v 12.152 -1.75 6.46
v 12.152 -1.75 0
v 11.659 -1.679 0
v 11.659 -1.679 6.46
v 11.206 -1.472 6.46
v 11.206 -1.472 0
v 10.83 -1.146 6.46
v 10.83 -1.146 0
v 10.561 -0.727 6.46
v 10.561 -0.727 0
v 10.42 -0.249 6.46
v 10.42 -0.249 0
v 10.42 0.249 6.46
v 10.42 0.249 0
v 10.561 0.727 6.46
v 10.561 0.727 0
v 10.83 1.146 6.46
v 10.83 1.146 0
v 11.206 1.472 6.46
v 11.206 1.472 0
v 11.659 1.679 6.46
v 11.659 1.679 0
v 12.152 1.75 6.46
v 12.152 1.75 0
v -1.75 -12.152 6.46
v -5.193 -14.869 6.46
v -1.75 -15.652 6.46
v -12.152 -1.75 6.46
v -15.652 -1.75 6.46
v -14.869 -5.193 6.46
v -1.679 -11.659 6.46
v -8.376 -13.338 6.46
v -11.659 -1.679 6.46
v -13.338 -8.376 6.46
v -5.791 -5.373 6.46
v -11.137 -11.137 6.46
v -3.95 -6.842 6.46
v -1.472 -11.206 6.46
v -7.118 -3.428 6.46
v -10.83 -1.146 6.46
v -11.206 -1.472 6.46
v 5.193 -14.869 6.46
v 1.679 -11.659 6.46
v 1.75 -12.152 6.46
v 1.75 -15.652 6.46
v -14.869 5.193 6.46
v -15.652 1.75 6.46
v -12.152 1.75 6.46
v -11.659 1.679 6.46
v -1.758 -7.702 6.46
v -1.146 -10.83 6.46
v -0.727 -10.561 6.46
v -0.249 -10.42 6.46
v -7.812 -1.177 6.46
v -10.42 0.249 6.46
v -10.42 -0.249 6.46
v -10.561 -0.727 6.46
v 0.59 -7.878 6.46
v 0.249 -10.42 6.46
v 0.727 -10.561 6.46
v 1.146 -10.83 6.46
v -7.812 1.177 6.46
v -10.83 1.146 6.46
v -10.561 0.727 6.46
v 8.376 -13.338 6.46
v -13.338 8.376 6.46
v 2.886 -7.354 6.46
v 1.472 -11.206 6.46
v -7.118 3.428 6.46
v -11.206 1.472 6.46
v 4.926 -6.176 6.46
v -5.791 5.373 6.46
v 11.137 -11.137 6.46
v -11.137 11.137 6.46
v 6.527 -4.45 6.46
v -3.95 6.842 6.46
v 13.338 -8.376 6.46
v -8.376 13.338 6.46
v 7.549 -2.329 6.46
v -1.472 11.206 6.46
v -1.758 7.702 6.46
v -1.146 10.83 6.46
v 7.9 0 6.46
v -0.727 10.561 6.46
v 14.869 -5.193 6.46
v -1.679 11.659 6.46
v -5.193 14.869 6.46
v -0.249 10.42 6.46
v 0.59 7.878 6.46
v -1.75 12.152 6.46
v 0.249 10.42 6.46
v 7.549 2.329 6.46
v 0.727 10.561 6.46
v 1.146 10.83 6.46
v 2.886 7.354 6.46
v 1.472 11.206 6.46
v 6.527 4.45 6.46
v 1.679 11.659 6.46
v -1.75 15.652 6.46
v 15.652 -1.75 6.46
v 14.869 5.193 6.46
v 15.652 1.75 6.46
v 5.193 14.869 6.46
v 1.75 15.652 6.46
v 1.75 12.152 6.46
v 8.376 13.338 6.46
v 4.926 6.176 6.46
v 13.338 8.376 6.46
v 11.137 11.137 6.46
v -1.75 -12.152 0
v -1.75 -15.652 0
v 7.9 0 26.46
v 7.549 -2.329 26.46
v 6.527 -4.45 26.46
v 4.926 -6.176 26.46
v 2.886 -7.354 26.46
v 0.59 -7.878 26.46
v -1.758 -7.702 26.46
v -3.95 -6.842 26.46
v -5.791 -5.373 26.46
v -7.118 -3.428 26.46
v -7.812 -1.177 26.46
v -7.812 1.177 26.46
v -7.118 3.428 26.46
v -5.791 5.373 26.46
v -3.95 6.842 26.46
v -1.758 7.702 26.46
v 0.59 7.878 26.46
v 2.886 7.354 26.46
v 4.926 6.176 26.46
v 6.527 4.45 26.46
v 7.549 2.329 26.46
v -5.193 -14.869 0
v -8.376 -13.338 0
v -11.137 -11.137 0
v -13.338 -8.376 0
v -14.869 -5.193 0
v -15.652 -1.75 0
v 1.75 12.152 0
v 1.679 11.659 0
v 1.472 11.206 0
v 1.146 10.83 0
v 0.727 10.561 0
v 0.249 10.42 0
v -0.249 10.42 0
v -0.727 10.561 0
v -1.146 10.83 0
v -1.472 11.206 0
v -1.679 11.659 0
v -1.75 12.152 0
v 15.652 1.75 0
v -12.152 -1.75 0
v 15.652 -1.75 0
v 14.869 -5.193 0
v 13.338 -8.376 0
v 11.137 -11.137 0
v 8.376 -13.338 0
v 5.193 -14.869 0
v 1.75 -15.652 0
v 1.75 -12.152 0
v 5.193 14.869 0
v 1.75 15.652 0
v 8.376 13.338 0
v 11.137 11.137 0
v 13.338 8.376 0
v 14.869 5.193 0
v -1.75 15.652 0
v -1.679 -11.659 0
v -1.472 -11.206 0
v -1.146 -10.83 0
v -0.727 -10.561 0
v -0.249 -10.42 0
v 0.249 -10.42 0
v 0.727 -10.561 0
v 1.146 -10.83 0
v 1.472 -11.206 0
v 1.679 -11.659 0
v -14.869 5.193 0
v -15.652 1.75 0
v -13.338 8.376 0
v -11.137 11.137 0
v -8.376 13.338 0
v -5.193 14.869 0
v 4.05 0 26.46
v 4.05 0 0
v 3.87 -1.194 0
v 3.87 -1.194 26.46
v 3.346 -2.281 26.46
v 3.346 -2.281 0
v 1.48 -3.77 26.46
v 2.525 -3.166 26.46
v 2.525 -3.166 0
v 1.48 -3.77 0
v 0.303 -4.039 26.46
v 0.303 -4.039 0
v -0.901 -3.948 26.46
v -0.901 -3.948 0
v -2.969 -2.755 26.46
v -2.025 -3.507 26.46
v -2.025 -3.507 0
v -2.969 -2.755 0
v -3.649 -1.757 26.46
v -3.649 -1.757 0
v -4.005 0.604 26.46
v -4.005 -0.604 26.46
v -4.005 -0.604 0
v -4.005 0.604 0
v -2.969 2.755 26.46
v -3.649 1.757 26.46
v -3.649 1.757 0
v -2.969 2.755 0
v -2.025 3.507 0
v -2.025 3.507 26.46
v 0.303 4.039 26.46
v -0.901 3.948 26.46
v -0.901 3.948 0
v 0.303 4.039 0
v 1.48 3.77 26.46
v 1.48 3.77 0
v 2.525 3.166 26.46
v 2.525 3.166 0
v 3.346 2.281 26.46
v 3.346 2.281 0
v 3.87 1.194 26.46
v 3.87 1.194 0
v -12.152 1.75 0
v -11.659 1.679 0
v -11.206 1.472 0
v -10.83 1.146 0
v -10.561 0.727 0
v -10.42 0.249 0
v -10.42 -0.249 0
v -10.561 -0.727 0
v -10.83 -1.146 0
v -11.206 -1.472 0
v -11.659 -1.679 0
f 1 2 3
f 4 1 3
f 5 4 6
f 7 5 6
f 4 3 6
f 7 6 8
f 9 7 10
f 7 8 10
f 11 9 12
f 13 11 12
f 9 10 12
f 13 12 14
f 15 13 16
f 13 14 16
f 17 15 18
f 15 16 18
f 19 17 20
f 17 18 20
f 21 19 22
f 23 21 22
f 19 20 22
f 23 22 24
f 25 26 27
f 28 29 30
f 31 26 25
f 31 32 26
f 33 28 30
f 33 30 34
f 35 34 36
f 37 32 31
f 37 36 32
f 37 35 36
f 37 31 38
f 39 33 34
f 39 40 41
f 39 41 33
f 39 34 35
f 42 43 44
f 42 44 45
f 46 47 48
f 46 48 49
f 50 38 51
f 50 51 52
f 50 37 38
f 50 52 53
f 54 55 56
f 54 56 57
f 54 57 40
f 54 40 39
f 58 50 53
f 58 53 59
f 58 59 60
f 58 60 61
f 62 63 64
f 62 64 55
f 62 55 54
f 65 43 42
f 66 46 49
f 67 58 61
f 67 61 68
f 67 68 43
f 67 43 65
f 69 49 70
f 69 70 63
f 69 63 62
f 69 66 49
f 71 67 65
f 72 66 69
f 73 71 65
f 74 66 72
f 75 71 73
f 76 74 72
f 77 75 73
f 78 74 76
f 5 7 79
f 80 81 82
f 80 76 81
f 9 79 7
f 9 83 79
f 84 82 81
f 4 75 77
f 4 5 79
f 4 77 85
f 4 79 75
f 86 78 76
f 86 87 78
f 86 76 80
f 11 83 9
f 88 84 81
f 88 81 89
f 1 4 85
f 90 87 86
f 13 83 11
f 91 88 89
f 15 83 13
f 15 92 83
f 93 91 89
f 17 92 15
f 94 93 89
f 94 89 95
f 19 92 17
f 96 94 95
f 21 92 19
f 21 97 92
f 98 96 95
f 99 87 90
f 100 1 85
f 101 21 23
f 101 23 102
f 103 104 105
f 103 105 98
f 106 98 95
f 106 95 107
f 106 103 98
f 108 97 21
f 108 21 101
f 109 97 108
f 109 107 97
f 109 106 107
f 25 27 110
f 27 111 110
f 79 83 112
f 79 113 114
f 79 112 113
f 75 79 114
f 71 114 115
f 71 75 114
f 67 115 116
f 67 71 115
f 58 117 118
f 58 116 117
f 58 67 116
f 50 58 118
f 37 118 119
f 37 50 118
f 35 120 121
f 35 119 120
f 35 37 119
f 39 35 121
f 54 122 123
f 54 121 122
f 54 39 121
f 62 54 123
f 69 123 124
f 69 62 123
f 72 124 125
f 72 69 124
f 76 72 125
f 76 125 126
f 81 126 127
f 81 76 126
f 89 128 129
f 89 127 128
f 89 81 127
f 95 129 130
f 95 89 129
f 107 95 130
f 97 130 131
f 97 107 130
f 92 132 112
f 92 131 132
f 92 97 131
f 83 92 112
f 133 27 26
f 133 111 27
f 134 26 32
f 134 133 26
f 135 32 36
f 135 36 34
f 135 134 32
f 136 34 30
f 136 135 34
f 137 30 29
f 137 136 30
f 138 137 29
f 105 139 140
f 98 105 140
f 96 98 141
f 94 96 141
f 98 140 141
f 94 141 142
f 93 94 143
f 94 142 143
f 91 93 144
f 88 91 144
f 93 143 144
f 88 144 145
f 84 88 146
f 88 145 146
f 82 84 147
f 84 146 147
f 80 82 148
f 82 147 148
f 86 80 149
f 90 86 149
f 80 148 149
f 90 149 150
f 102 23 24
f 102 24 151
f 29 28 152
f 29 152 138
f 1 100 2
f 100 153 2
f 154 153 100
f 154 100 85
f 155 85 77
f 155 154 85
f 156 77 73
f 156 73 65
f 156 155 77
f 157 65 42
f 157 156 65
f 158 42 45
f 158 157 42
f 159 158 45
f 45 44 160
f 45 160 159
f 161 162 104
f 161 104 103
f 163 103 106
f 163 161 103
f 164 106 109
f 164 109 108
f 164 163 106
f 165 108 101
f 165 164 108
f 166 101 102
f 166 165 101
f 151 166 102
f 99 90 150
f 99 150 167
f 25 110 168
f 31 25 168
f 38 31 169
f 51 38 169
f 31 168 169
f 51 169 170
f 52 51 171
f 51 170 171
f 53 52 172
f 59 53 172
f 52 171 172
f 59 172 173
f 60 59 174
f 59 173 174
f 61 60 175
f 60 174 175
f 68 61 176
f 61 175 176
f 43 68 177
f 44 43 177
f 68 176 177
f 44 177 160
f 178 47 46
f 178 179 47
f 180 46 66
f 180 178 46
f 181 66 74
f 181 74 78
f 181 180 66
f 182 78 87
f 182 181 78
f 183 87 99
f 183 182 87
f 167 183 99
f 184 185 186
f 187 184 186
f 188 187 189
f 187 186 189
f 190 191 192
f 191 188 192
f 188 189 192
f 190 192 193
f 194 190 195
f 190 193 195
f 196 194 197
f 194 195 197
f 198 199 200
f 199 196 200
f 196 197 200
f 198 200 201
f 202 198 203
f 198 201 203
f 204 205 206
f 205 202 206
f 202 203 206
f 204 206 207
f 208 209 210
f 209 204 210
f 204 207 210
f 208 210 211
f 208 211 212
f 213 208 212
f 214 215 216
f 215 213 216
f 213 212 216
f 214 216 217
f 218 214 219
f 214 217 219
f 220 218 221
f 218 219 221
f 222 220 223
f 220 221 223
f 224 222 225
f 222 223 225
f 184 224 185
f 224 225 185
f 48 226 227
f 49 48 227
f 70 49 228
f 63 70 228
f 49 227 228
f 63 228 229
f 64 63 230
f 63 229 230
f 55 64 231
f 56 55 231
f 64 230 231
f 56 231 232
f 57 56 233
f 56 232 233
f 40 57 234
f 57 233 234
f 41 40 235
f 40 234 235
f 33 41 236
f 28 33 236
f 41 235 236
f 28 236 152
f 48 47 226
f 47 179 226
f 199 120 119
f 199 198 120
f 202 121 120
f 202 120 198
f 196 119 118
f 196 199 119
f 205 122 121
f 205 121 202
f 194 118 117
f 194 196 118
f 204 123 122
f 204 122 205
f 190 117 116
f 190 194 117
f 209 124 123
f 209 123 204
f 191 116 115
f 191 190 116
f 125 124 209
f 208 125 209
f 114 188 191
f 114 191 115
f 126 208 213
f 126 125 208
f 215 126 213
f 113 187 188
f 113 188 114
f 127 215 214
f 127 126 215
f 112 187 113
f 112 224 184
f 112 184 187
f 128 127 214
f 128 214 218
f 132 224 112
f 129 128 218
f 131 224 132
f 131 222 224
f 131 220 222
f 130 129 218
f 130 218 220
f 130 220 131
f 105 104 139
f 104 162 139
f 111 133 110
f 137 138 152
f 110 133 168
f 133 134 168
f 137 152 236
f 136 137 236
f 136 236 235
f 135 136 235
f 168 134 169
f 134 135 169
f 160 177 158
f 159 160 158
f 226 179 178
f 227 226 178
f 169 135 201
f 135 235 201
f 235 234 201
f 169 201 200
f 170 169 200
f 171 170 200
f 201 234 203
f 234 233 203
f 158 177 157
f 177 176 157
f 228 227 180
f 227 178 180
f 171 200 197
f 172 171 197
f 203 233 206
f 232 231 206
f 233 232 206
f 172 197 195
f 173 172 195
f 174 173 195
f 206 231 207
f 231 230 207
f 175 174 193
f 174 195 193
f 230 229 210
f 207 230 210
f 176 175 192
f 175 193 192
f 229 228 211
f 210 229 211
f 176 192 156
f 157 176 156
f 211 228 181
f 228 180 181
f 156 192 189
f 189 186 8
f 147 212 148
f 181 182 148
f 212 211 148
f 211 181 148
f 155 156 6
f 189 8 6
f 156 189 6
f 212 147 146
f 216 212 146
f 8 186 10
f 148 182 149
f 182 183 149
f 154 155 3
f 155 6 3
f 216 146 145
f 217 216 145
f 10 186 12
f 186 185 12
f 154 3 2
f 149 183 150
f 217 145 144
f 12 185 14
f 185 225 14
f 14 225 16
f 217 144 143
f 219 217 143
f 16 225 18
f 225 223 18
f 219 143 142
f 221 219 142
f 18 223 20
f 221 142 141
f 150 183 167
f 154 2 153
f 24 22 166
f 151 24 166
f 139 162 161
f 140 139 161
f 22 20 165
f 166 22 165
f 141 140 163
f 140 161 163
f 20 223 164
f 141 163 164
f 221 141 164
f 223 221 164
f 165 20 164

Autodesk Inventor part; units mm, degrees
ref_plane "YZ Plane" through (0, 0, 0) normal (1, 0, 0) x (0, 1, 0)
ref_plane "XZ Plane" through (0, 0, 0) normal (0, 1, 0) x (-1, 0, 0)
ref_plane "XY Plane" through (0, 0, 0) normal (0, 0, 1) x (1, 0, 0)
sketch "Sketch1" plane through (0, 0, 0) normal (0, 0, 1) x (1, 0, 0)
  circle A0 centre (0, 0) radius 15.75
  circle A1 centre (0, 0) radius 4.05
  dimension "d0" = 31.5
  dimension "d1" = 8.1
extrude "Extrusion1" add sketch "Sketch1" along normal blind 6.46
sketch "Sketch2" plane through (0, 0, 6.46) normal (0, 0, 1) x (1, 0, 0)
  circle A0 centre (0, 0) radius 4.05 projected
  circle A1 centre (0, 0) radius 15.75 projected
  circle A2 centre (0, 0) radius 7.9
  circle A3 centre (0, 0) radius 4.05
  dimension "d4" = 15.8
extrude "Extrusion2" add sketch "Sketch2" along normal blind 20 contours A2
sketch "Sketch3" plane through (0, 0, 0) normal (0, 0, -1) x (-1, 0, 0)
  circle A0 centre (0, 0) radius 4.05 projected
  circle A1 centre (0, 0) radius 15.75 projected
  line L0 (-1.75, 15.6525) -> (-1.75, 12.1525)
  line L1 (1.75, 12.1525) -> (1.75, 15.6525)
  arc A2 (-1.75, 12.1525) -> (1.75, 12.1525) centre (0, 12.1525) ccw
  arc A3 (1.75, 15.6525) -> (-1.75, 15.6525) centre (0, 0) ccw
  dimension "d7" = 3.5
  dimension "d8" = 3.5
extrude "Extrusion3" cut sketch "Sketch3" against normal blind 20 contours L1 A2 L0 A1 picked at (0.1948, 13.3481)
pattern_circular "Circular Pattern1" count 4 over 360 about axis through (0, 0, 0) along (0, 0, 1) of "Extrusion3"
properties part number "Nut"
